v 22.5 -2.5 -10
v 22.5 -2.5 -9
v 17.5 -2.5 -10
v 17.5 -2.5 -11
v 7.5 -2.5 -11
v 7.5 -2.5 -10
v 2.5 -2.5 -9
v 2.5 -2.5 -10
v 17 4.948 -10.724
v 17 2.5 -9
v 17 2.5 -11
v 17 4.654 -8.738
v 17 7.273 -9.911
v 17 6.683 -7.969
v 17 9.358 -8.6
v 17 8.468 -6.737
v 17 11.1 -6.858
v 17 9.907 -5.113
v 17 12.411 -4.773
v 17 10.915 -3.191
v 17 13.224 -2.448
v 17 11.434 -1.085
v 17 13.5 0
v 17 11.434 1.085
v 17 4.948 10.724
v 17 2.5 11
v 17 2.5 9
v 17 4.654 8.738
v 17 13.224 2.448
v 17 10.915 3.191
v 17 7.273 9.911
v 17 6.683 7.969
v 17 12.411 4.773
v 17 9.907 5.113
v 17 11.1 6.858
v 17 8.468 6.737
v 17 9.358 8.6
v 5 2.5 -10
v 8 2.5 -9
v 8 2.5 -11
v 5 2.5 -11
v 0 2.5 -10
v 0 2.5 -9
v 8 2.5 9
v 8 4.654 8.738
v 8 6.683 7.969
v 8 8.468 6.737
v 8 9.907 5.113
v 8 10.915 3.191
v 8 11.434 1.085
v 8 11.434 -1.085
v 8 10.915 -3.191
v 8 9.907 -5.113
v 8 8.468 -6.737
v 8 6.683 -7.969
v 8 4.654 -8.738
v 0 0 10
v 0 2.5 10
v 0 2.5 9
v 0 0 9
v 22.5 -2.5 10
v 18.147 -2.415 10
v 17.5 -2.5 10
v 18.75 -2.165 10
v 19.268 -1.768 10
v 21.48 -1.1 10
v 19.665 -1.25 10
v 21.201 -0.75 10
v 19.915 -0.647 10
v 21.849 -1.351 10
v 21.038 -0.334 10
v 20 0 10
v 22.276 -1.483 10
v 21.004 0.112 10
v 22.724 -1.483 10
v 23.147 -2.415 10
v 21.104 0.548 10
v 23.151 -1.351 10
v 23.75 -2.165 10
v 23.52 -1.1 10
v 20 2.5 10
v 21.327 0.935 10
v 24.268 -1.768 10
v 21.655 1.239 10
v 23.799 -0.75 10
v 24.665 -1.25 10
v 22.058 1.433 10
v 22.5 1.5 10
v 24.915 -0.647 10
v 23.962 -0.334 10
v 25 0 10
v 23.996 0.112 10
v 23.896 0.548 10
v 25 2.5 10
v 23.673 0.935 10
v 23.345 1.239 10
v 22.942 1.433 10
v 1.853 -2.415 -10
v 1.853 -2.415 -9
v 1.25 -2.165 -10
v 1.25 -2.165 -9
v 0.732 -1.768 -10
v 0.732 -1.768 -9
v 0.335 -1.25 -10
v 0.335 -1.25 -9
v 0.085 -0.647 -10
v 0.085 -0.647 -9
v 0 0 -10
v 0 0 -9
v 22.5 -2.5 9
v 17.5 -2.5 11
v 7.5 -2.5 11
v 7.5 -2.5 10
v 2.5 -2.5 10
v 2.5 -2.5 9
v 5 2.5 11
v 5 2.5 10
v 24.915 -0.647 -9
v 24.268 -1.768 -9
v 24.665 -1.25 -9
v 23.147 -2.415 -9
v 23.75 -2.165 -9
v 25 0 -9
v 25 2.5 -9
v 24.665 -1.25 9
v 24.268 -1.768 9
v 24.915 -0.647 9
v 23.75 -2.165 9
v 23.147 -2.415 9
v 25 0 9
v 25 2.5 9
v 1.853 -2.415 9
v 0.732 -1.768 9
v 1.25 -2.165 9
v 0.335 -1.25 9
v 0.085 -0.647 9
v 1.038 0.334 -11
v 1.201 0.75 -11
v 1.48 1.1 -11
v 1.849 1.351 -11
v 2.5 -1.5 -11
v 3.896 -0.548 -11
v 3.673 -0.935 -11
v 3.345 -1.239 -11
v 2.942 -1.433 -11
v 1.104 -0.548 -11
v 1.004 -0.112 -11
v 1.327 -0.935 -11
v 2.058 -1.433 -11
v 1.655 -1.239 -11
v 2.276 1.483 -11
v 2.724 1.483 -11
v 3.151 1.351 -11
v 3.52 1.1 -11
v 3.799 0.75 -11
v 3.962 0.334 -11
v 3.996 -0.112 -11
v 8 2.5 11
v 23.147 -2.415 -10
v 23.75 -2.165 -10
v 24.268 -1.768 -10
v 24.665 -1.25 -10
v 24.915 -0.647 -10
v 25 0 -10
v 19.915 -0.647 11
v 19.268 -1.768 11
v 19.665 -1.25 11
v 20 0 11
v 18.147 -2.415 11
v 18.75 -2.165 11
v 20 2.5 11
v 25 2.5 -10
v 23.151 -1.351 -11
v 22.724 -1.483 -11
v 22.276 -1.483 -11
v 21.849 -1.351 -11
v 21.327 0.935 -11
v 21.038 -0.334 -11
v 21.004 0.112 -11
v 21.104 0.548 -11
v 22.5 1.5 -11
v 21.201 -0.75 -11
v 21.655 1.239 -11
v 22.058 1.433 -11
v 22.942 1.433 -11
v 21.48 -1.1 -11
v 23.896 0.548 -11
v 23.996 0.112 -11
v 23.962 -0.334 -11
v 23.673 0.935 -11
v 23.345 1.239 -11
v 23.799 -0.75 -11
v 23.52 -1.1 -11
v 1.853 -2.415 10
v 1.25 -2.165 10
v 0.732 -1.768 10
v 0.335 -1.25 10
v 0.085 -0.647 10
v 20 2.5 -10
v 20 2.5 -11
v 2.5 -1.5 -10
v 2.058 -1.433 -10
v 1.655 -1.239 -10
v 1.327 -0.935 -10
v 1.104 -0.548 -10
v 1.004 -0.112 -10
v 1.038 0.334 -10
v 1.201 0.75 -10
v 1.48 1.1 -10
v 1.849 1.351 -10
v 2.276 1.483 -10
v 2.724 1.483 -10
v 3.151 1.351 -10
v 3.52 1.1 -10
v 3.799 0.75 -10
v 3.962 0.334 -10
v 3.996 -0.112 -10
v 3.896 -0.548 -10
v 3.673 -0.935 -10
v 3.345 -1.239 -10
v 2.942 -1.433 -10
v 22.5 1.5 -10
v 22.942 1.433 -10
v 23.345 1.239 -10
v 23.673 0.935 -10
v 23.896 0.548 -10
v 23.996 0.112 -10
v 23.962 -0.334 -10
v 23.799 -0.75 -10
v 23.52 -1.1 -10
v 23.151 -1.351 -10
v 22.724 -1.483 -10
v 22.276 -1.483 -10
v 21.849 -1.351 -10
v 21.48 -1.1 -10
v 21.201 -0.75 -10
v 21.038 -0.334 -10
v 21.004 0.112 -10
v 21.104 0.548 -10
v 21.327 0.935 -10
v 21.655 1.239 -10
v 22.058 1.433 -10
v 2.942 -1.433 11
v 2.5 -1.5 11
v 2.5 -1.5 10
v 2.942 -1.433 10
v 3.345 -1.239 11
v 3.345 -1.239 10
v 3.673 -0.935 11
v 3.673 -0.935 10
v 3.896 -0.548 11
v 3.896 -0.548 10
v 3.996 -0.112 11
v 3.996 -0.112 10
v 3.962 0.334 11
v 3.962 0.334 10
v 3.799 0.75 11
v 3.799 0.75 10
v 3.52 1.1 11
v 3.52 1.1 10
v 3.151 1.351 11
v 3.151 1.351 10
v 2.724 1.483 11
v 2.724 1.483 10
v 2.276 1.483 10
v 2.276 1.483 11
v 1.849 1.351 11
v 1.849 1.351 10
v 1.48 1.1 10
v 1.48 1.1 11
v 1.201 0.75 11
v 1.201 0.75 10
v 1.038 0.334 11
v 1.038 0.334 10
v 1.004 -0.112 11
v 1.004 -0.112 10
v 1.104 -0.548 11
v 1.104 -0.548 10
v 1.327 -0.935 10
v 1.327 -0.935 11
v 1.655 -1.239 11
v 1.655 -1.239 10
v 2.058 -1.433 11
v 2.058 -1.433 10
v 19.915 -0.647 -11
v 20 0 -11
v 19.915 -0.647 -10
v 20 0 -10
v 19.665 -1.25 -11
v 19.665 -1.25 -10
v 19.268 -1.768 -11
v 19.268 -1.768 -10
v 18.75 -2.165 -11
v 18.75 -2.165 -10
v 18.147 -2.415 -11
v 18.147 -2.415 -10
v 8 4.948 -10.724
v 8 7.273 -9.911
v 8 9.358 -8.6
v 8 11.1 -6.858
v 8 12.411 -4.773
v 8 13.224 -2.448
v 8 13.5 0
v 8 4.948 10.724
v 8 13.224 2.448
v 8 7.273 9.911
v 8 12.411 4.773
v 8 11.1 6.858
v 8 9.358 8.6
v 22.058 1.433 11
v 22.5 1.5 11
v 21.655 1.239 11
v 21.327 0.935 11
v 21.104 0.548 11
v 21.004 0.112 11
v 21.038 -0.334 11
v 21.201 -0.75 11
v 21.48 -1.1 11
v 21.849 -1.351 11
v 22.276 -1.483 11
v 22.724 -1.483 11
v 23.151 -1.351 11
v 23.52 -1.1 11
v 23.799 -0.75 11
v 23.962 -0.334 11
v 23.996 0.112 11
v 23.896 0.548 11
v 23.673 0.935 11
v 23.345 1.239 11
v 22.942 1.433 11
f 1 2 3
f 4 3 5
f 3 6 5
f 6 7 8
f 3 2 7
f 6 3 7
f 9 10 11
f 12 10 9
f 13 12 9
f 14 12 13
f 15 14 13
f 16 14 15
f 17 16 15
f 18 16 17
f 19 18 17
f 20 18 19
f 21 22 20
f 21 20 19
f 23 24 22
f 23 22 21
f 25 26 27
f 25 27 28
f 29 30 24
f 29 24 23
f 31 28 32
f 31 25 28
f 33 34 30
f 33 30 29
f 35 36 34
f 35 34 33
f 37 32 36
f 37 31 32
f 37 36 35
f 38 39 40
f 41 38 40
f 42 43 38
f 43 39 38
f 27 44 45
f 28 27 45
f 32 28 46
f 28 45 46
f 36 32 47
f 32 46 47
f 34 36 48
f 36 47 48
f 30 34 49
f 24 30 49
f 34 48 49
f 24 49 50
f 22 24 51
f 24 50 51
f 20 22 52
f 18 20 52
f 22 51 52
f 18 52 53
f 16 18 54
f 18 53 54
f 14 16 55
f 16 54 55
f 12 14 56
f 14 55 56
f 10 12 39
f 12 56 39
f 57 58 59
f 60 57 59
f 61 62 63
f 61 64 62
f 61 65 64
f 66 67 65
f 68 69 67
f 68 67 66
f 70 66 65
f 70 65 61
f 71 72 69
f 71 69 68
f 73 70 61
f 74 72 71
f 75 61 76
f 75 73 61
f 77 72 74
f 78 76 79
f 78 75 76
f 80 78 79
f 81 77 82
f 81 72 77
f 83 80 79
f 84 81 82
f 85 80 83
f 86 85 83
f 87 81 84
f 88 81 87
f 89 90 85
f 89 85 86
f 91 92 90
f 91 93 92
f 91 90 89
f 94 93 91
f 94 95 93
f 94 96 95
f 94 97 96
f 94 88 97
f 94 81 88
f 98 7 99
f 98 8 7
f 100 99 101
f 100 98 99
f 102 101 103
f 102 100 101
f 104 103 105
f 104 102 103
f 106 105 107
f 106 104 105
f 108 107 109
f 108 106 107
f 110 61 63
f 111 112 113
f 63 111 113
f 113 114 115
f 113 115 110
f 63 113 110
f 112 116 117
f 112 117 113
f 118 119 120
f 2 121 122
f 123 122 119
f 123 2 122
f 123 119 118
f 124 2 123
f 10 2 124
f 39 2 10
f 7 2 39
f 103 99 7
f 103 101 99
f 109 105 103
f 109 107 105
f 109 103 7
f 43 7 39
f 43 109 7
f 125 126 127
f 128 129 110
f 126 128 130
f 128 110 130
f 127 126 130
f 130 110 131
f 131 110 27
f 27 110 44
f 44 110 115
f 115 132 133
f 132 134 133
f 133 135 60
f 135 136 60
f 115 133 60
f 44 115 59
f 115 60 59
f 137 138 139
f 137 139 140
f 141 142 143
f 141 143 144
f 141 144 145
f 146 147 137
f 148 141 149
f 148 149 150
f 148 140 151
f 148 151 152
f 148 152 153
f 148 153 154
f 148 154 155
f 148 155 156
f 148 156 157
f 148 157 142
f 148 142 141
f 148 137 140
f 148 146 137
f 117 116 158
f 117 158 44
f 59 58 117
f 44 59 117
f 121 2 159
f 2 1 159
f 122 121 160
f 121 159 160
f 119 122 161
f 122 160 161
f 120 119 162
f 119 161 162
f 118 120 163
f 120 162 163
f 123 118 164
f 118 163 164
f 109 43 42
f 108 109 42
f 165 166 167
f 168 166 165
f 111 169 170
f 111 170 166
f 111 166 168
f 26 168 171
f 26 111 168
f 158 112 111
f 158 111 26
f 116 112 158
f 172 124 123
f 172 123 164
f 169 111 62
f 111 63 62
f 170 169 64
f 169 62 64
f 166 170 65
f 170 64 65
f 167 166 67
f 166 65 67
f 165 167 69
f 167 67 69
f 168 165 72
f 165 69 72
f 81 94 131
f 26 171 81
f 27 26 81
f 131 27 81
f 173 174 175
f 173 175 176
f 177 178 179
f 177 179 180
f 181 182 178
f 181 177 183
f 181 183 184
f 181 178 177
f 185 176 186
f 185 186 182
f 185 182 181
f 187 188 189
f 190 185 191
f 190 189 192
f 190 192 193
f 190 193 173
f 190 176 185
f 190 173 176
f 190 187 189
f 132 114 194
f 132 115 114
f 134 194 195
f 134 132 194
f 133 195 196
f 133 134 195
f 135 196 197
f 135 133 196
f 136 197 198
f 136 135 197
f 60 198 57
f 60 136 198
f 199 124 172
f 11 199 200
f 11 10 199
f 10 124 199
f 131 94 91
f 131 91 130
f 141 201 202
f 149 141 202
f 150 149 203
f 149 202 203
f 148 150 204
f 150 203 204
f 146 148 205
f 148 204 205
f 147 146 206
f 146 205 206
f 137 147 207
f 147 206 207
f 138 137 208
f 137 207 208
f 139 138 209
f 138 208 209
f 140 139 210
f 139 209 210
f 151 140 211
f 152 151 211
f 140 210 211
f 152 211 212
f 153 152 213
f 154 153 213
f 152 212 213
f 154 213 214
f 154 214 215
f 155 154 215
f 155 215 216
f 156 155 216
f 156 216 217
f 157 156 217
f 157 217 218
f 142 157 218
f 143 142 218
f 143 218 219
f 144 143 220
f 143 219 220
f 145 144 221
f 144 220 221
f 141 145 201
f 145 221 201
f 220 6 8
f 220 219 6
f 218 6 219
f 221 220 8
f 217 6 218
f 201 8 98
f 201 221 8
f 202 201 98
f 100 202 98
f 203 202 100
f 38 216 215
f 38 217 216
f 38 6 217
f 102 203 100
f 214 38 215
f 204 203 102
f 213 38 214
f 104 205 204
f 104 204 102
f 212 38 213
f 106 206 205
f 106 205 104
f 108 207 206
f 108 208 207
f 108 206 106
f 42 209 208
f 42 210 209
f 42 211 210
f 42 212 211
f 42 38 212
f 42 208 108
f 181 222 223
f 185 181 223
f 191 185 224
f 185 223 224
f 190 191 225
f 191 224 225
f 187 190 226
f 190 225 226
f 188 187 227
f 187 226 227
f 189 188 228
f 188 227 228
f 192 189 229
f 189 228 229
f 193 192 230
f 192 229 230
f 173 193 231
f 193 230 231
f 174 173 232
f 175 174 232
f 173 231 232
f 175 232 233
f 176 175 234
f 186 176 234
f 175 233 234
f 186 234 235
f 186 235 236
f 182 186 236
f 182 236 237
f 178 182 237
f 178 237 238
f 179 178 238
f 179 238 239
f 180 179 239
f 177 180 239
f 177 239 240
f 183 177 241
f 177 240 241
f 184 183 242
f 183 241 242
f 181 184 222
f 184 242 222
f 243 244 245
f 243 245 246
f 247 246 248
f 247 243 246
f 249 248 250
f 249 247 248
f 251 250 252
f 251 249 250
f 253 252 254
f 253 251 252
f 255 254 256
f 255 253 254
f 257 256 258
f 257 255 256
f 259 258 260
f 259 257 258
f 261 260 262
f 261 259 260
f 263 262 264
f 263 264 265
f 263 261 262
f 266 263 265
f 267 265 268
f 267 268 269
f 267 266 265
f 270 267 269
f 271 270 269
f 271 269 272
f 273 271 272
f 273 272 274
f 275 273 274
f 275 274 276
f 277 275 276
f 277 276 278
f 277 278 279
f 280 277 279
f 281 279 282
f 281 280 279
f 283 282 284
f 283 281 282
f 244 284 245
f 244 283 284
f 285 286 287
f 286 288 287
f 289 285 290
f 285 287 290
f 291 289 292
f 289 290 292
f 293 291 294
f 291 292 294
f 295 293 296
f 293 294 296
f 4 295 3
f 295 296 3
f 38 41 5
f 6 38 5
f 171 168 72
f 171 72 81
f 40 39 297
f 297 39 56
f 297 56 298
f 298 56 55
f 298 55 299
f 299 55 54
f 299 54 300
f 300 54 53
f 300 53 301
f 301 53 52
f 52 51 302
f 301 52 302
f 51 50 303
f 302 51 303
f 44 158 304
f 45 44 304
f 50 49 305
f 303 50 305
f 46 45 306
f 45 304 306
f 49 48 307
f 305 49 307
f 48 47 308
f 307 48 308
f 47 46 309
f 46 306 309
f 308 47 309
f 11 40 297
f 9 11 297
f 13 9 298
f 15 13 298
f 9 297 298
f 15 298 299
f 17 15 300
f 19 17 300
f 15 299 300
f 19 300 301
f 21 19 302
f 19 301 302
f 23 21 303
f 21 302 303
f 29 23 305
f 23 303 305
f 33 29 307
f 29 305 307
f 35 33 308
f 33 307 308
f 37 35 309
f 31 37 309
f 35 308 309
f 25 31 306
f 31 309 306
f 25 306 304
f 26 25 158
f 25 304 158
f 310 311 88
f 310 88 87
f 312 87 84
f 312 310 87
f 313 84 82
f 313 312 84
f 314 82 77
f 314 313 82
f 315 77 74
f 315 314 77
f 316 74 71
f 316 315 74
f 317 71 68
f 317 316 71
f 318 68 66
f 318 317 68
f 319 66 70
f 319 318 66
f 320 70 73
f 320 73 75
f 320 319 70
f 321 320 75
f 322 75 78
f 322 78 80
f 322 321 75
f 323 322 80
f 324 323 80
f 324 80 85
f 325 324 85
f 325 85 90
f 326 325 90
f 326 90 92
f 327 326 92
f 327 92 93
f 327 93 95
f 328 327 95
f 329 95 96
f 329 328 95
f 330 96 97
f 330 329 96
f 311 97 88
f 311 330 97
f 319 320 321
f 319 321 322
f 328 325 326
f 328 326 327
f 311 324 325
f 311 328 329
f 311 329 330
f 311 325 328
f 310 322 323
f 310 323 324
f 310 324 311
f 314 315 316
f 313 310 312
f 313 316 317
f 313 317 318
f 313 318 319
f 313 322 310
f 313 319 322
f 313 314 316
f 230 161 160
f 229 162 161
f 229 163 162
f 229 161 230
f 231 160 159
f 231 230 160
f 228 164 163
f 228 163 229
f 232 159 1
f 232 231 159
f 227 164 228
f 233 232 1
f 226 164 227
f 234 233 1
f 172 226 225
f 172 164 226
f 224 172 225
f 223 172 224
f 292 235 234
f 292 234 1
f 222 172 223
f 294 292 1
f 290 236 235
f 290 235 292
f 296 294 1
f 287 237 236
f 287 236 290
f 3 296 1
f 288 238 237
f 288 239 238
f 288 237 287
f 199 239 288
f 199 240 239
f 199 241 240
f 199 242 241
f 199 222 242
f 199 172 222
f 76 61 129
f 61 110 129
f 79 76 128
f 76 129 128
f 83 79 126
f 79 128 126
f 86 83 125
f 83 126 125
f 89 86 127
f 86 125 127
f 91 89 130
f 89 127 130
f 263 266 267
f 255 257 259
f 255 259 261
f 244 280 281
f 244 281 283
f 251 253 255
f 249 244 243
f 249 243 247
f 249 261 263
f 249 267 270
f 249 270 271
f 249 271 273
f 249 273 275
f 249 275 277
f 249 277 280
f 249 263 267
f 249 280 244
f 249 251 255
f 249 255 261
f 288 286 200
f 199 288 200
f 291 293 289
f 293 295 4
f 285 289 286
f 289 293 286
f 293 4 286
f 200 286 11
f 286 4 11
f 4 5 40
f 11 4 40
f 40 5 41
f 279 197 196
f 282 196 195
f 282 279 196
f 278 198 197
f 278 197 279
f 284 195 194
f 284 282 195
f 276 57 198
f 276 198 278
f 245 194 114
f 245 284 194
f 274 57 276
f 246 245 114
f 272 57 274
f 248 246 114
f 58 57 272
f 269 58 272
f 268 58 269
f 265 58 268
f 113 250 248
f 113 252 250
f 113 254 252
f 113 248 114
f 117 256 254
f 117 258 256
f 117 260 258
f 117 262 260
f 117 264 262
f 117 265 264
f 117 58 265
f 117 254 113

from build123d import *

# Parameters (mm, degrees)
SKETCH3_W             = 2
SKETCH3_H             = 5
BOSS_EXTRUDE1_DEPTH   = 25
BOSS_EXTRUDE1_2_DEPTH = 25
SKETCH4_W             = 5
SKETCH4_H             = 5
CUT_EXTRUDE1_DEPTH    = 1
SKETCH5_W             = 5
SKETCH5_H             = 5
CUT_EXTRUDE2_DEPTH    = 1
SWEEP1_START          = 8
SWEEP1_DEPTH          = 9
SKETCH7_R             = 1.5
BOSS_EXTRUDE2_DEPTH   = 1
BOSS_EXTRUDE3_START   = 1
SKETCH8_R             = 1.5
BOSS_EXTRUDE3_DEPTH   = 1
FILLET1_R             = 2.5
CUT_EXTRUDE3_DEPTH    = 1
CUT_EXTRUDE4_DEPTH    = 1
FILLET2_R             = 2.5


# Read off the part's stored shape, not the designer's step: Sweep1
with BuildPart() as part:
    # Sketch3 → Boss-Extrude1 (new body)
    with BuildSketch(Plane(origin=(0, 0, 0), x_dir=(0, 0, -1), z_dir=(1, 0, 0))):
        with Locations((-10, 0)):
            Rectangle(SKETCH3_W, SKETCH3_H)
    extrude(amount=BOSS_EXTRUDE1_DEPTH)

    # Sketch4 → Cut-Extrude1 (cut)
    with BuildSketch(Plane.XY.offset(11)):
        with Locations((2.5, 0)):
            Rectangle(SKETCH4_W, SKETCH4_H)
        with Locations((22.5, 0)):
            Rectangle(SKETCH4_W, SKETCH4_H)
    extrude(amount=-CUT_EXTRUDE1_DEPTH, mode=Mode.SUBTRACT)



with BuildPart() as body_2:
    # Sketch3 → Boss-Extrude1 2 (new body)
    with BuildSketch(Plane(origin=(0, 0, 0), x_dir=(0, 0, -1), z_dir=(1, 0, 0))):
        with Locations((10, 0)):
            Rectangle(SKETCH3_W, SKETCH3_H)
    extrude(amount=BOSS_EXTRUDE1_2_DEPTH)

    # Sketch5 → Cut-Extrude2 (cut)
    with BuildSketch(Plane(origin=(0, 0, -11), x_dir=(-1, 0, 0), z_dir=(0, 0, -1))):
        with Locations((-22.5, 0)):
            Rectangle(SKETCH5_W, SKETCH5_H)
        with Locations((-2.5, 0)):
            Rectangle(SKETCH5_W, SKETCH5_H)
    extrude(amount=-CUT_EXTRUDE2_DEPTH, mode=Mode.SUBTRACT)


with BuildPart() as part_1:
    add(part.part)

    add(body_2.part)  # Sweep1 merges body 2
    # Sweep1 outline → Sweep1 (add)
    with BuildSketch(Plane.YZ.offset(SWEEP1_START)):
        with BuildLine():
            Line((2.5, -9), (2.5, -11))
            ThreePointArc((2.5, -11), (13.5, 0), (2.5, 11))
            Line((2.5, 11), (2.5, 9))
            ThreePointArc((2.5, 9), (11.5, 0), (2.5, -9))
        make_face()
    extrude(amount=SWEEP1_DEPTH)

    # Sketch7 → Boss-Extrude2 (add)
    with BuildSketch(Plane(origin=(0, 0, -10), x_dir=(-1, 0, 0), z_dir=(0, 0, -1))):
        with Locations(Location((-2.5, 0, 0), (0, 0, 270))):
            Circle(SKETCH7_R)
        with Locations(Location((-22.5, 0, 0), (0, 0, 90))):
            Circle(SKETCH7_R)
    extrude(amount=BOSS_EXTRUDE2_DEPTH)

    # Sketch8 → Boss-Extrude3 (add)
    with BuildSketch(Plane.XY.offset(10).offset(BOSS_EXTRUDE3_START)):
        with Locations(Location((22.5, 0, 0), (0, 0, 90))):
            Circle(SKETCH8_R)
        with Locations(Location((2.5, 0, 0), (0, 0, 270))):
            Circle(SKETCH8_R)
    extrude(amount=-BOSS_EXTRUDE3_DEPTH)

    # Fillet1
    fillet1_edges = [part_1.edges().sort_by_distance(p)[0] for p in [
        (0, -2.5, 9.5),
        (25, -2.5, 9.5),
        (25, -2.5, -9.5),
        (0, -2.5, -9.5),
    ]]
    fillet(fillet1_edges, radius=FILLET1_R)

    # Sketch9 → Cut-Extrude3 (cut)
    with BuildSketch(Plane.XY.offset(11)):
        Polygon((5, 2.5), (7.5, -2.5), (5, -2.5), align=None)
    extrude(amount=-CUT_EXTRUDE3_DEPTH, mode=Mode.SUBTRACT)

    # Sketch10 → Cut-Extrude4 (cut)
    with BuildSketch(Plane(origin=(0, 0, -11), x_dir=(-1, 0, 0), z_dir=(0, 0, -1))):
        Polygon((-5, 2.5), (-7.5, -2.5), (-5, -2.5), align=None)
    extrude(amount=-CUT_EXTRUDE4_DEPTH, mode=Mode.SUBTRACT)

    # Fillet2
    fillet2_edges = [part_1.edges().sort_by_distance(p)[0] for p in [
        (20, -2.5, 10.5),
        (20, -2.5, -10.5),
    ]]
    fillet(fillet2_edges, radius=FILLET2_R)


solid = part_1.part
